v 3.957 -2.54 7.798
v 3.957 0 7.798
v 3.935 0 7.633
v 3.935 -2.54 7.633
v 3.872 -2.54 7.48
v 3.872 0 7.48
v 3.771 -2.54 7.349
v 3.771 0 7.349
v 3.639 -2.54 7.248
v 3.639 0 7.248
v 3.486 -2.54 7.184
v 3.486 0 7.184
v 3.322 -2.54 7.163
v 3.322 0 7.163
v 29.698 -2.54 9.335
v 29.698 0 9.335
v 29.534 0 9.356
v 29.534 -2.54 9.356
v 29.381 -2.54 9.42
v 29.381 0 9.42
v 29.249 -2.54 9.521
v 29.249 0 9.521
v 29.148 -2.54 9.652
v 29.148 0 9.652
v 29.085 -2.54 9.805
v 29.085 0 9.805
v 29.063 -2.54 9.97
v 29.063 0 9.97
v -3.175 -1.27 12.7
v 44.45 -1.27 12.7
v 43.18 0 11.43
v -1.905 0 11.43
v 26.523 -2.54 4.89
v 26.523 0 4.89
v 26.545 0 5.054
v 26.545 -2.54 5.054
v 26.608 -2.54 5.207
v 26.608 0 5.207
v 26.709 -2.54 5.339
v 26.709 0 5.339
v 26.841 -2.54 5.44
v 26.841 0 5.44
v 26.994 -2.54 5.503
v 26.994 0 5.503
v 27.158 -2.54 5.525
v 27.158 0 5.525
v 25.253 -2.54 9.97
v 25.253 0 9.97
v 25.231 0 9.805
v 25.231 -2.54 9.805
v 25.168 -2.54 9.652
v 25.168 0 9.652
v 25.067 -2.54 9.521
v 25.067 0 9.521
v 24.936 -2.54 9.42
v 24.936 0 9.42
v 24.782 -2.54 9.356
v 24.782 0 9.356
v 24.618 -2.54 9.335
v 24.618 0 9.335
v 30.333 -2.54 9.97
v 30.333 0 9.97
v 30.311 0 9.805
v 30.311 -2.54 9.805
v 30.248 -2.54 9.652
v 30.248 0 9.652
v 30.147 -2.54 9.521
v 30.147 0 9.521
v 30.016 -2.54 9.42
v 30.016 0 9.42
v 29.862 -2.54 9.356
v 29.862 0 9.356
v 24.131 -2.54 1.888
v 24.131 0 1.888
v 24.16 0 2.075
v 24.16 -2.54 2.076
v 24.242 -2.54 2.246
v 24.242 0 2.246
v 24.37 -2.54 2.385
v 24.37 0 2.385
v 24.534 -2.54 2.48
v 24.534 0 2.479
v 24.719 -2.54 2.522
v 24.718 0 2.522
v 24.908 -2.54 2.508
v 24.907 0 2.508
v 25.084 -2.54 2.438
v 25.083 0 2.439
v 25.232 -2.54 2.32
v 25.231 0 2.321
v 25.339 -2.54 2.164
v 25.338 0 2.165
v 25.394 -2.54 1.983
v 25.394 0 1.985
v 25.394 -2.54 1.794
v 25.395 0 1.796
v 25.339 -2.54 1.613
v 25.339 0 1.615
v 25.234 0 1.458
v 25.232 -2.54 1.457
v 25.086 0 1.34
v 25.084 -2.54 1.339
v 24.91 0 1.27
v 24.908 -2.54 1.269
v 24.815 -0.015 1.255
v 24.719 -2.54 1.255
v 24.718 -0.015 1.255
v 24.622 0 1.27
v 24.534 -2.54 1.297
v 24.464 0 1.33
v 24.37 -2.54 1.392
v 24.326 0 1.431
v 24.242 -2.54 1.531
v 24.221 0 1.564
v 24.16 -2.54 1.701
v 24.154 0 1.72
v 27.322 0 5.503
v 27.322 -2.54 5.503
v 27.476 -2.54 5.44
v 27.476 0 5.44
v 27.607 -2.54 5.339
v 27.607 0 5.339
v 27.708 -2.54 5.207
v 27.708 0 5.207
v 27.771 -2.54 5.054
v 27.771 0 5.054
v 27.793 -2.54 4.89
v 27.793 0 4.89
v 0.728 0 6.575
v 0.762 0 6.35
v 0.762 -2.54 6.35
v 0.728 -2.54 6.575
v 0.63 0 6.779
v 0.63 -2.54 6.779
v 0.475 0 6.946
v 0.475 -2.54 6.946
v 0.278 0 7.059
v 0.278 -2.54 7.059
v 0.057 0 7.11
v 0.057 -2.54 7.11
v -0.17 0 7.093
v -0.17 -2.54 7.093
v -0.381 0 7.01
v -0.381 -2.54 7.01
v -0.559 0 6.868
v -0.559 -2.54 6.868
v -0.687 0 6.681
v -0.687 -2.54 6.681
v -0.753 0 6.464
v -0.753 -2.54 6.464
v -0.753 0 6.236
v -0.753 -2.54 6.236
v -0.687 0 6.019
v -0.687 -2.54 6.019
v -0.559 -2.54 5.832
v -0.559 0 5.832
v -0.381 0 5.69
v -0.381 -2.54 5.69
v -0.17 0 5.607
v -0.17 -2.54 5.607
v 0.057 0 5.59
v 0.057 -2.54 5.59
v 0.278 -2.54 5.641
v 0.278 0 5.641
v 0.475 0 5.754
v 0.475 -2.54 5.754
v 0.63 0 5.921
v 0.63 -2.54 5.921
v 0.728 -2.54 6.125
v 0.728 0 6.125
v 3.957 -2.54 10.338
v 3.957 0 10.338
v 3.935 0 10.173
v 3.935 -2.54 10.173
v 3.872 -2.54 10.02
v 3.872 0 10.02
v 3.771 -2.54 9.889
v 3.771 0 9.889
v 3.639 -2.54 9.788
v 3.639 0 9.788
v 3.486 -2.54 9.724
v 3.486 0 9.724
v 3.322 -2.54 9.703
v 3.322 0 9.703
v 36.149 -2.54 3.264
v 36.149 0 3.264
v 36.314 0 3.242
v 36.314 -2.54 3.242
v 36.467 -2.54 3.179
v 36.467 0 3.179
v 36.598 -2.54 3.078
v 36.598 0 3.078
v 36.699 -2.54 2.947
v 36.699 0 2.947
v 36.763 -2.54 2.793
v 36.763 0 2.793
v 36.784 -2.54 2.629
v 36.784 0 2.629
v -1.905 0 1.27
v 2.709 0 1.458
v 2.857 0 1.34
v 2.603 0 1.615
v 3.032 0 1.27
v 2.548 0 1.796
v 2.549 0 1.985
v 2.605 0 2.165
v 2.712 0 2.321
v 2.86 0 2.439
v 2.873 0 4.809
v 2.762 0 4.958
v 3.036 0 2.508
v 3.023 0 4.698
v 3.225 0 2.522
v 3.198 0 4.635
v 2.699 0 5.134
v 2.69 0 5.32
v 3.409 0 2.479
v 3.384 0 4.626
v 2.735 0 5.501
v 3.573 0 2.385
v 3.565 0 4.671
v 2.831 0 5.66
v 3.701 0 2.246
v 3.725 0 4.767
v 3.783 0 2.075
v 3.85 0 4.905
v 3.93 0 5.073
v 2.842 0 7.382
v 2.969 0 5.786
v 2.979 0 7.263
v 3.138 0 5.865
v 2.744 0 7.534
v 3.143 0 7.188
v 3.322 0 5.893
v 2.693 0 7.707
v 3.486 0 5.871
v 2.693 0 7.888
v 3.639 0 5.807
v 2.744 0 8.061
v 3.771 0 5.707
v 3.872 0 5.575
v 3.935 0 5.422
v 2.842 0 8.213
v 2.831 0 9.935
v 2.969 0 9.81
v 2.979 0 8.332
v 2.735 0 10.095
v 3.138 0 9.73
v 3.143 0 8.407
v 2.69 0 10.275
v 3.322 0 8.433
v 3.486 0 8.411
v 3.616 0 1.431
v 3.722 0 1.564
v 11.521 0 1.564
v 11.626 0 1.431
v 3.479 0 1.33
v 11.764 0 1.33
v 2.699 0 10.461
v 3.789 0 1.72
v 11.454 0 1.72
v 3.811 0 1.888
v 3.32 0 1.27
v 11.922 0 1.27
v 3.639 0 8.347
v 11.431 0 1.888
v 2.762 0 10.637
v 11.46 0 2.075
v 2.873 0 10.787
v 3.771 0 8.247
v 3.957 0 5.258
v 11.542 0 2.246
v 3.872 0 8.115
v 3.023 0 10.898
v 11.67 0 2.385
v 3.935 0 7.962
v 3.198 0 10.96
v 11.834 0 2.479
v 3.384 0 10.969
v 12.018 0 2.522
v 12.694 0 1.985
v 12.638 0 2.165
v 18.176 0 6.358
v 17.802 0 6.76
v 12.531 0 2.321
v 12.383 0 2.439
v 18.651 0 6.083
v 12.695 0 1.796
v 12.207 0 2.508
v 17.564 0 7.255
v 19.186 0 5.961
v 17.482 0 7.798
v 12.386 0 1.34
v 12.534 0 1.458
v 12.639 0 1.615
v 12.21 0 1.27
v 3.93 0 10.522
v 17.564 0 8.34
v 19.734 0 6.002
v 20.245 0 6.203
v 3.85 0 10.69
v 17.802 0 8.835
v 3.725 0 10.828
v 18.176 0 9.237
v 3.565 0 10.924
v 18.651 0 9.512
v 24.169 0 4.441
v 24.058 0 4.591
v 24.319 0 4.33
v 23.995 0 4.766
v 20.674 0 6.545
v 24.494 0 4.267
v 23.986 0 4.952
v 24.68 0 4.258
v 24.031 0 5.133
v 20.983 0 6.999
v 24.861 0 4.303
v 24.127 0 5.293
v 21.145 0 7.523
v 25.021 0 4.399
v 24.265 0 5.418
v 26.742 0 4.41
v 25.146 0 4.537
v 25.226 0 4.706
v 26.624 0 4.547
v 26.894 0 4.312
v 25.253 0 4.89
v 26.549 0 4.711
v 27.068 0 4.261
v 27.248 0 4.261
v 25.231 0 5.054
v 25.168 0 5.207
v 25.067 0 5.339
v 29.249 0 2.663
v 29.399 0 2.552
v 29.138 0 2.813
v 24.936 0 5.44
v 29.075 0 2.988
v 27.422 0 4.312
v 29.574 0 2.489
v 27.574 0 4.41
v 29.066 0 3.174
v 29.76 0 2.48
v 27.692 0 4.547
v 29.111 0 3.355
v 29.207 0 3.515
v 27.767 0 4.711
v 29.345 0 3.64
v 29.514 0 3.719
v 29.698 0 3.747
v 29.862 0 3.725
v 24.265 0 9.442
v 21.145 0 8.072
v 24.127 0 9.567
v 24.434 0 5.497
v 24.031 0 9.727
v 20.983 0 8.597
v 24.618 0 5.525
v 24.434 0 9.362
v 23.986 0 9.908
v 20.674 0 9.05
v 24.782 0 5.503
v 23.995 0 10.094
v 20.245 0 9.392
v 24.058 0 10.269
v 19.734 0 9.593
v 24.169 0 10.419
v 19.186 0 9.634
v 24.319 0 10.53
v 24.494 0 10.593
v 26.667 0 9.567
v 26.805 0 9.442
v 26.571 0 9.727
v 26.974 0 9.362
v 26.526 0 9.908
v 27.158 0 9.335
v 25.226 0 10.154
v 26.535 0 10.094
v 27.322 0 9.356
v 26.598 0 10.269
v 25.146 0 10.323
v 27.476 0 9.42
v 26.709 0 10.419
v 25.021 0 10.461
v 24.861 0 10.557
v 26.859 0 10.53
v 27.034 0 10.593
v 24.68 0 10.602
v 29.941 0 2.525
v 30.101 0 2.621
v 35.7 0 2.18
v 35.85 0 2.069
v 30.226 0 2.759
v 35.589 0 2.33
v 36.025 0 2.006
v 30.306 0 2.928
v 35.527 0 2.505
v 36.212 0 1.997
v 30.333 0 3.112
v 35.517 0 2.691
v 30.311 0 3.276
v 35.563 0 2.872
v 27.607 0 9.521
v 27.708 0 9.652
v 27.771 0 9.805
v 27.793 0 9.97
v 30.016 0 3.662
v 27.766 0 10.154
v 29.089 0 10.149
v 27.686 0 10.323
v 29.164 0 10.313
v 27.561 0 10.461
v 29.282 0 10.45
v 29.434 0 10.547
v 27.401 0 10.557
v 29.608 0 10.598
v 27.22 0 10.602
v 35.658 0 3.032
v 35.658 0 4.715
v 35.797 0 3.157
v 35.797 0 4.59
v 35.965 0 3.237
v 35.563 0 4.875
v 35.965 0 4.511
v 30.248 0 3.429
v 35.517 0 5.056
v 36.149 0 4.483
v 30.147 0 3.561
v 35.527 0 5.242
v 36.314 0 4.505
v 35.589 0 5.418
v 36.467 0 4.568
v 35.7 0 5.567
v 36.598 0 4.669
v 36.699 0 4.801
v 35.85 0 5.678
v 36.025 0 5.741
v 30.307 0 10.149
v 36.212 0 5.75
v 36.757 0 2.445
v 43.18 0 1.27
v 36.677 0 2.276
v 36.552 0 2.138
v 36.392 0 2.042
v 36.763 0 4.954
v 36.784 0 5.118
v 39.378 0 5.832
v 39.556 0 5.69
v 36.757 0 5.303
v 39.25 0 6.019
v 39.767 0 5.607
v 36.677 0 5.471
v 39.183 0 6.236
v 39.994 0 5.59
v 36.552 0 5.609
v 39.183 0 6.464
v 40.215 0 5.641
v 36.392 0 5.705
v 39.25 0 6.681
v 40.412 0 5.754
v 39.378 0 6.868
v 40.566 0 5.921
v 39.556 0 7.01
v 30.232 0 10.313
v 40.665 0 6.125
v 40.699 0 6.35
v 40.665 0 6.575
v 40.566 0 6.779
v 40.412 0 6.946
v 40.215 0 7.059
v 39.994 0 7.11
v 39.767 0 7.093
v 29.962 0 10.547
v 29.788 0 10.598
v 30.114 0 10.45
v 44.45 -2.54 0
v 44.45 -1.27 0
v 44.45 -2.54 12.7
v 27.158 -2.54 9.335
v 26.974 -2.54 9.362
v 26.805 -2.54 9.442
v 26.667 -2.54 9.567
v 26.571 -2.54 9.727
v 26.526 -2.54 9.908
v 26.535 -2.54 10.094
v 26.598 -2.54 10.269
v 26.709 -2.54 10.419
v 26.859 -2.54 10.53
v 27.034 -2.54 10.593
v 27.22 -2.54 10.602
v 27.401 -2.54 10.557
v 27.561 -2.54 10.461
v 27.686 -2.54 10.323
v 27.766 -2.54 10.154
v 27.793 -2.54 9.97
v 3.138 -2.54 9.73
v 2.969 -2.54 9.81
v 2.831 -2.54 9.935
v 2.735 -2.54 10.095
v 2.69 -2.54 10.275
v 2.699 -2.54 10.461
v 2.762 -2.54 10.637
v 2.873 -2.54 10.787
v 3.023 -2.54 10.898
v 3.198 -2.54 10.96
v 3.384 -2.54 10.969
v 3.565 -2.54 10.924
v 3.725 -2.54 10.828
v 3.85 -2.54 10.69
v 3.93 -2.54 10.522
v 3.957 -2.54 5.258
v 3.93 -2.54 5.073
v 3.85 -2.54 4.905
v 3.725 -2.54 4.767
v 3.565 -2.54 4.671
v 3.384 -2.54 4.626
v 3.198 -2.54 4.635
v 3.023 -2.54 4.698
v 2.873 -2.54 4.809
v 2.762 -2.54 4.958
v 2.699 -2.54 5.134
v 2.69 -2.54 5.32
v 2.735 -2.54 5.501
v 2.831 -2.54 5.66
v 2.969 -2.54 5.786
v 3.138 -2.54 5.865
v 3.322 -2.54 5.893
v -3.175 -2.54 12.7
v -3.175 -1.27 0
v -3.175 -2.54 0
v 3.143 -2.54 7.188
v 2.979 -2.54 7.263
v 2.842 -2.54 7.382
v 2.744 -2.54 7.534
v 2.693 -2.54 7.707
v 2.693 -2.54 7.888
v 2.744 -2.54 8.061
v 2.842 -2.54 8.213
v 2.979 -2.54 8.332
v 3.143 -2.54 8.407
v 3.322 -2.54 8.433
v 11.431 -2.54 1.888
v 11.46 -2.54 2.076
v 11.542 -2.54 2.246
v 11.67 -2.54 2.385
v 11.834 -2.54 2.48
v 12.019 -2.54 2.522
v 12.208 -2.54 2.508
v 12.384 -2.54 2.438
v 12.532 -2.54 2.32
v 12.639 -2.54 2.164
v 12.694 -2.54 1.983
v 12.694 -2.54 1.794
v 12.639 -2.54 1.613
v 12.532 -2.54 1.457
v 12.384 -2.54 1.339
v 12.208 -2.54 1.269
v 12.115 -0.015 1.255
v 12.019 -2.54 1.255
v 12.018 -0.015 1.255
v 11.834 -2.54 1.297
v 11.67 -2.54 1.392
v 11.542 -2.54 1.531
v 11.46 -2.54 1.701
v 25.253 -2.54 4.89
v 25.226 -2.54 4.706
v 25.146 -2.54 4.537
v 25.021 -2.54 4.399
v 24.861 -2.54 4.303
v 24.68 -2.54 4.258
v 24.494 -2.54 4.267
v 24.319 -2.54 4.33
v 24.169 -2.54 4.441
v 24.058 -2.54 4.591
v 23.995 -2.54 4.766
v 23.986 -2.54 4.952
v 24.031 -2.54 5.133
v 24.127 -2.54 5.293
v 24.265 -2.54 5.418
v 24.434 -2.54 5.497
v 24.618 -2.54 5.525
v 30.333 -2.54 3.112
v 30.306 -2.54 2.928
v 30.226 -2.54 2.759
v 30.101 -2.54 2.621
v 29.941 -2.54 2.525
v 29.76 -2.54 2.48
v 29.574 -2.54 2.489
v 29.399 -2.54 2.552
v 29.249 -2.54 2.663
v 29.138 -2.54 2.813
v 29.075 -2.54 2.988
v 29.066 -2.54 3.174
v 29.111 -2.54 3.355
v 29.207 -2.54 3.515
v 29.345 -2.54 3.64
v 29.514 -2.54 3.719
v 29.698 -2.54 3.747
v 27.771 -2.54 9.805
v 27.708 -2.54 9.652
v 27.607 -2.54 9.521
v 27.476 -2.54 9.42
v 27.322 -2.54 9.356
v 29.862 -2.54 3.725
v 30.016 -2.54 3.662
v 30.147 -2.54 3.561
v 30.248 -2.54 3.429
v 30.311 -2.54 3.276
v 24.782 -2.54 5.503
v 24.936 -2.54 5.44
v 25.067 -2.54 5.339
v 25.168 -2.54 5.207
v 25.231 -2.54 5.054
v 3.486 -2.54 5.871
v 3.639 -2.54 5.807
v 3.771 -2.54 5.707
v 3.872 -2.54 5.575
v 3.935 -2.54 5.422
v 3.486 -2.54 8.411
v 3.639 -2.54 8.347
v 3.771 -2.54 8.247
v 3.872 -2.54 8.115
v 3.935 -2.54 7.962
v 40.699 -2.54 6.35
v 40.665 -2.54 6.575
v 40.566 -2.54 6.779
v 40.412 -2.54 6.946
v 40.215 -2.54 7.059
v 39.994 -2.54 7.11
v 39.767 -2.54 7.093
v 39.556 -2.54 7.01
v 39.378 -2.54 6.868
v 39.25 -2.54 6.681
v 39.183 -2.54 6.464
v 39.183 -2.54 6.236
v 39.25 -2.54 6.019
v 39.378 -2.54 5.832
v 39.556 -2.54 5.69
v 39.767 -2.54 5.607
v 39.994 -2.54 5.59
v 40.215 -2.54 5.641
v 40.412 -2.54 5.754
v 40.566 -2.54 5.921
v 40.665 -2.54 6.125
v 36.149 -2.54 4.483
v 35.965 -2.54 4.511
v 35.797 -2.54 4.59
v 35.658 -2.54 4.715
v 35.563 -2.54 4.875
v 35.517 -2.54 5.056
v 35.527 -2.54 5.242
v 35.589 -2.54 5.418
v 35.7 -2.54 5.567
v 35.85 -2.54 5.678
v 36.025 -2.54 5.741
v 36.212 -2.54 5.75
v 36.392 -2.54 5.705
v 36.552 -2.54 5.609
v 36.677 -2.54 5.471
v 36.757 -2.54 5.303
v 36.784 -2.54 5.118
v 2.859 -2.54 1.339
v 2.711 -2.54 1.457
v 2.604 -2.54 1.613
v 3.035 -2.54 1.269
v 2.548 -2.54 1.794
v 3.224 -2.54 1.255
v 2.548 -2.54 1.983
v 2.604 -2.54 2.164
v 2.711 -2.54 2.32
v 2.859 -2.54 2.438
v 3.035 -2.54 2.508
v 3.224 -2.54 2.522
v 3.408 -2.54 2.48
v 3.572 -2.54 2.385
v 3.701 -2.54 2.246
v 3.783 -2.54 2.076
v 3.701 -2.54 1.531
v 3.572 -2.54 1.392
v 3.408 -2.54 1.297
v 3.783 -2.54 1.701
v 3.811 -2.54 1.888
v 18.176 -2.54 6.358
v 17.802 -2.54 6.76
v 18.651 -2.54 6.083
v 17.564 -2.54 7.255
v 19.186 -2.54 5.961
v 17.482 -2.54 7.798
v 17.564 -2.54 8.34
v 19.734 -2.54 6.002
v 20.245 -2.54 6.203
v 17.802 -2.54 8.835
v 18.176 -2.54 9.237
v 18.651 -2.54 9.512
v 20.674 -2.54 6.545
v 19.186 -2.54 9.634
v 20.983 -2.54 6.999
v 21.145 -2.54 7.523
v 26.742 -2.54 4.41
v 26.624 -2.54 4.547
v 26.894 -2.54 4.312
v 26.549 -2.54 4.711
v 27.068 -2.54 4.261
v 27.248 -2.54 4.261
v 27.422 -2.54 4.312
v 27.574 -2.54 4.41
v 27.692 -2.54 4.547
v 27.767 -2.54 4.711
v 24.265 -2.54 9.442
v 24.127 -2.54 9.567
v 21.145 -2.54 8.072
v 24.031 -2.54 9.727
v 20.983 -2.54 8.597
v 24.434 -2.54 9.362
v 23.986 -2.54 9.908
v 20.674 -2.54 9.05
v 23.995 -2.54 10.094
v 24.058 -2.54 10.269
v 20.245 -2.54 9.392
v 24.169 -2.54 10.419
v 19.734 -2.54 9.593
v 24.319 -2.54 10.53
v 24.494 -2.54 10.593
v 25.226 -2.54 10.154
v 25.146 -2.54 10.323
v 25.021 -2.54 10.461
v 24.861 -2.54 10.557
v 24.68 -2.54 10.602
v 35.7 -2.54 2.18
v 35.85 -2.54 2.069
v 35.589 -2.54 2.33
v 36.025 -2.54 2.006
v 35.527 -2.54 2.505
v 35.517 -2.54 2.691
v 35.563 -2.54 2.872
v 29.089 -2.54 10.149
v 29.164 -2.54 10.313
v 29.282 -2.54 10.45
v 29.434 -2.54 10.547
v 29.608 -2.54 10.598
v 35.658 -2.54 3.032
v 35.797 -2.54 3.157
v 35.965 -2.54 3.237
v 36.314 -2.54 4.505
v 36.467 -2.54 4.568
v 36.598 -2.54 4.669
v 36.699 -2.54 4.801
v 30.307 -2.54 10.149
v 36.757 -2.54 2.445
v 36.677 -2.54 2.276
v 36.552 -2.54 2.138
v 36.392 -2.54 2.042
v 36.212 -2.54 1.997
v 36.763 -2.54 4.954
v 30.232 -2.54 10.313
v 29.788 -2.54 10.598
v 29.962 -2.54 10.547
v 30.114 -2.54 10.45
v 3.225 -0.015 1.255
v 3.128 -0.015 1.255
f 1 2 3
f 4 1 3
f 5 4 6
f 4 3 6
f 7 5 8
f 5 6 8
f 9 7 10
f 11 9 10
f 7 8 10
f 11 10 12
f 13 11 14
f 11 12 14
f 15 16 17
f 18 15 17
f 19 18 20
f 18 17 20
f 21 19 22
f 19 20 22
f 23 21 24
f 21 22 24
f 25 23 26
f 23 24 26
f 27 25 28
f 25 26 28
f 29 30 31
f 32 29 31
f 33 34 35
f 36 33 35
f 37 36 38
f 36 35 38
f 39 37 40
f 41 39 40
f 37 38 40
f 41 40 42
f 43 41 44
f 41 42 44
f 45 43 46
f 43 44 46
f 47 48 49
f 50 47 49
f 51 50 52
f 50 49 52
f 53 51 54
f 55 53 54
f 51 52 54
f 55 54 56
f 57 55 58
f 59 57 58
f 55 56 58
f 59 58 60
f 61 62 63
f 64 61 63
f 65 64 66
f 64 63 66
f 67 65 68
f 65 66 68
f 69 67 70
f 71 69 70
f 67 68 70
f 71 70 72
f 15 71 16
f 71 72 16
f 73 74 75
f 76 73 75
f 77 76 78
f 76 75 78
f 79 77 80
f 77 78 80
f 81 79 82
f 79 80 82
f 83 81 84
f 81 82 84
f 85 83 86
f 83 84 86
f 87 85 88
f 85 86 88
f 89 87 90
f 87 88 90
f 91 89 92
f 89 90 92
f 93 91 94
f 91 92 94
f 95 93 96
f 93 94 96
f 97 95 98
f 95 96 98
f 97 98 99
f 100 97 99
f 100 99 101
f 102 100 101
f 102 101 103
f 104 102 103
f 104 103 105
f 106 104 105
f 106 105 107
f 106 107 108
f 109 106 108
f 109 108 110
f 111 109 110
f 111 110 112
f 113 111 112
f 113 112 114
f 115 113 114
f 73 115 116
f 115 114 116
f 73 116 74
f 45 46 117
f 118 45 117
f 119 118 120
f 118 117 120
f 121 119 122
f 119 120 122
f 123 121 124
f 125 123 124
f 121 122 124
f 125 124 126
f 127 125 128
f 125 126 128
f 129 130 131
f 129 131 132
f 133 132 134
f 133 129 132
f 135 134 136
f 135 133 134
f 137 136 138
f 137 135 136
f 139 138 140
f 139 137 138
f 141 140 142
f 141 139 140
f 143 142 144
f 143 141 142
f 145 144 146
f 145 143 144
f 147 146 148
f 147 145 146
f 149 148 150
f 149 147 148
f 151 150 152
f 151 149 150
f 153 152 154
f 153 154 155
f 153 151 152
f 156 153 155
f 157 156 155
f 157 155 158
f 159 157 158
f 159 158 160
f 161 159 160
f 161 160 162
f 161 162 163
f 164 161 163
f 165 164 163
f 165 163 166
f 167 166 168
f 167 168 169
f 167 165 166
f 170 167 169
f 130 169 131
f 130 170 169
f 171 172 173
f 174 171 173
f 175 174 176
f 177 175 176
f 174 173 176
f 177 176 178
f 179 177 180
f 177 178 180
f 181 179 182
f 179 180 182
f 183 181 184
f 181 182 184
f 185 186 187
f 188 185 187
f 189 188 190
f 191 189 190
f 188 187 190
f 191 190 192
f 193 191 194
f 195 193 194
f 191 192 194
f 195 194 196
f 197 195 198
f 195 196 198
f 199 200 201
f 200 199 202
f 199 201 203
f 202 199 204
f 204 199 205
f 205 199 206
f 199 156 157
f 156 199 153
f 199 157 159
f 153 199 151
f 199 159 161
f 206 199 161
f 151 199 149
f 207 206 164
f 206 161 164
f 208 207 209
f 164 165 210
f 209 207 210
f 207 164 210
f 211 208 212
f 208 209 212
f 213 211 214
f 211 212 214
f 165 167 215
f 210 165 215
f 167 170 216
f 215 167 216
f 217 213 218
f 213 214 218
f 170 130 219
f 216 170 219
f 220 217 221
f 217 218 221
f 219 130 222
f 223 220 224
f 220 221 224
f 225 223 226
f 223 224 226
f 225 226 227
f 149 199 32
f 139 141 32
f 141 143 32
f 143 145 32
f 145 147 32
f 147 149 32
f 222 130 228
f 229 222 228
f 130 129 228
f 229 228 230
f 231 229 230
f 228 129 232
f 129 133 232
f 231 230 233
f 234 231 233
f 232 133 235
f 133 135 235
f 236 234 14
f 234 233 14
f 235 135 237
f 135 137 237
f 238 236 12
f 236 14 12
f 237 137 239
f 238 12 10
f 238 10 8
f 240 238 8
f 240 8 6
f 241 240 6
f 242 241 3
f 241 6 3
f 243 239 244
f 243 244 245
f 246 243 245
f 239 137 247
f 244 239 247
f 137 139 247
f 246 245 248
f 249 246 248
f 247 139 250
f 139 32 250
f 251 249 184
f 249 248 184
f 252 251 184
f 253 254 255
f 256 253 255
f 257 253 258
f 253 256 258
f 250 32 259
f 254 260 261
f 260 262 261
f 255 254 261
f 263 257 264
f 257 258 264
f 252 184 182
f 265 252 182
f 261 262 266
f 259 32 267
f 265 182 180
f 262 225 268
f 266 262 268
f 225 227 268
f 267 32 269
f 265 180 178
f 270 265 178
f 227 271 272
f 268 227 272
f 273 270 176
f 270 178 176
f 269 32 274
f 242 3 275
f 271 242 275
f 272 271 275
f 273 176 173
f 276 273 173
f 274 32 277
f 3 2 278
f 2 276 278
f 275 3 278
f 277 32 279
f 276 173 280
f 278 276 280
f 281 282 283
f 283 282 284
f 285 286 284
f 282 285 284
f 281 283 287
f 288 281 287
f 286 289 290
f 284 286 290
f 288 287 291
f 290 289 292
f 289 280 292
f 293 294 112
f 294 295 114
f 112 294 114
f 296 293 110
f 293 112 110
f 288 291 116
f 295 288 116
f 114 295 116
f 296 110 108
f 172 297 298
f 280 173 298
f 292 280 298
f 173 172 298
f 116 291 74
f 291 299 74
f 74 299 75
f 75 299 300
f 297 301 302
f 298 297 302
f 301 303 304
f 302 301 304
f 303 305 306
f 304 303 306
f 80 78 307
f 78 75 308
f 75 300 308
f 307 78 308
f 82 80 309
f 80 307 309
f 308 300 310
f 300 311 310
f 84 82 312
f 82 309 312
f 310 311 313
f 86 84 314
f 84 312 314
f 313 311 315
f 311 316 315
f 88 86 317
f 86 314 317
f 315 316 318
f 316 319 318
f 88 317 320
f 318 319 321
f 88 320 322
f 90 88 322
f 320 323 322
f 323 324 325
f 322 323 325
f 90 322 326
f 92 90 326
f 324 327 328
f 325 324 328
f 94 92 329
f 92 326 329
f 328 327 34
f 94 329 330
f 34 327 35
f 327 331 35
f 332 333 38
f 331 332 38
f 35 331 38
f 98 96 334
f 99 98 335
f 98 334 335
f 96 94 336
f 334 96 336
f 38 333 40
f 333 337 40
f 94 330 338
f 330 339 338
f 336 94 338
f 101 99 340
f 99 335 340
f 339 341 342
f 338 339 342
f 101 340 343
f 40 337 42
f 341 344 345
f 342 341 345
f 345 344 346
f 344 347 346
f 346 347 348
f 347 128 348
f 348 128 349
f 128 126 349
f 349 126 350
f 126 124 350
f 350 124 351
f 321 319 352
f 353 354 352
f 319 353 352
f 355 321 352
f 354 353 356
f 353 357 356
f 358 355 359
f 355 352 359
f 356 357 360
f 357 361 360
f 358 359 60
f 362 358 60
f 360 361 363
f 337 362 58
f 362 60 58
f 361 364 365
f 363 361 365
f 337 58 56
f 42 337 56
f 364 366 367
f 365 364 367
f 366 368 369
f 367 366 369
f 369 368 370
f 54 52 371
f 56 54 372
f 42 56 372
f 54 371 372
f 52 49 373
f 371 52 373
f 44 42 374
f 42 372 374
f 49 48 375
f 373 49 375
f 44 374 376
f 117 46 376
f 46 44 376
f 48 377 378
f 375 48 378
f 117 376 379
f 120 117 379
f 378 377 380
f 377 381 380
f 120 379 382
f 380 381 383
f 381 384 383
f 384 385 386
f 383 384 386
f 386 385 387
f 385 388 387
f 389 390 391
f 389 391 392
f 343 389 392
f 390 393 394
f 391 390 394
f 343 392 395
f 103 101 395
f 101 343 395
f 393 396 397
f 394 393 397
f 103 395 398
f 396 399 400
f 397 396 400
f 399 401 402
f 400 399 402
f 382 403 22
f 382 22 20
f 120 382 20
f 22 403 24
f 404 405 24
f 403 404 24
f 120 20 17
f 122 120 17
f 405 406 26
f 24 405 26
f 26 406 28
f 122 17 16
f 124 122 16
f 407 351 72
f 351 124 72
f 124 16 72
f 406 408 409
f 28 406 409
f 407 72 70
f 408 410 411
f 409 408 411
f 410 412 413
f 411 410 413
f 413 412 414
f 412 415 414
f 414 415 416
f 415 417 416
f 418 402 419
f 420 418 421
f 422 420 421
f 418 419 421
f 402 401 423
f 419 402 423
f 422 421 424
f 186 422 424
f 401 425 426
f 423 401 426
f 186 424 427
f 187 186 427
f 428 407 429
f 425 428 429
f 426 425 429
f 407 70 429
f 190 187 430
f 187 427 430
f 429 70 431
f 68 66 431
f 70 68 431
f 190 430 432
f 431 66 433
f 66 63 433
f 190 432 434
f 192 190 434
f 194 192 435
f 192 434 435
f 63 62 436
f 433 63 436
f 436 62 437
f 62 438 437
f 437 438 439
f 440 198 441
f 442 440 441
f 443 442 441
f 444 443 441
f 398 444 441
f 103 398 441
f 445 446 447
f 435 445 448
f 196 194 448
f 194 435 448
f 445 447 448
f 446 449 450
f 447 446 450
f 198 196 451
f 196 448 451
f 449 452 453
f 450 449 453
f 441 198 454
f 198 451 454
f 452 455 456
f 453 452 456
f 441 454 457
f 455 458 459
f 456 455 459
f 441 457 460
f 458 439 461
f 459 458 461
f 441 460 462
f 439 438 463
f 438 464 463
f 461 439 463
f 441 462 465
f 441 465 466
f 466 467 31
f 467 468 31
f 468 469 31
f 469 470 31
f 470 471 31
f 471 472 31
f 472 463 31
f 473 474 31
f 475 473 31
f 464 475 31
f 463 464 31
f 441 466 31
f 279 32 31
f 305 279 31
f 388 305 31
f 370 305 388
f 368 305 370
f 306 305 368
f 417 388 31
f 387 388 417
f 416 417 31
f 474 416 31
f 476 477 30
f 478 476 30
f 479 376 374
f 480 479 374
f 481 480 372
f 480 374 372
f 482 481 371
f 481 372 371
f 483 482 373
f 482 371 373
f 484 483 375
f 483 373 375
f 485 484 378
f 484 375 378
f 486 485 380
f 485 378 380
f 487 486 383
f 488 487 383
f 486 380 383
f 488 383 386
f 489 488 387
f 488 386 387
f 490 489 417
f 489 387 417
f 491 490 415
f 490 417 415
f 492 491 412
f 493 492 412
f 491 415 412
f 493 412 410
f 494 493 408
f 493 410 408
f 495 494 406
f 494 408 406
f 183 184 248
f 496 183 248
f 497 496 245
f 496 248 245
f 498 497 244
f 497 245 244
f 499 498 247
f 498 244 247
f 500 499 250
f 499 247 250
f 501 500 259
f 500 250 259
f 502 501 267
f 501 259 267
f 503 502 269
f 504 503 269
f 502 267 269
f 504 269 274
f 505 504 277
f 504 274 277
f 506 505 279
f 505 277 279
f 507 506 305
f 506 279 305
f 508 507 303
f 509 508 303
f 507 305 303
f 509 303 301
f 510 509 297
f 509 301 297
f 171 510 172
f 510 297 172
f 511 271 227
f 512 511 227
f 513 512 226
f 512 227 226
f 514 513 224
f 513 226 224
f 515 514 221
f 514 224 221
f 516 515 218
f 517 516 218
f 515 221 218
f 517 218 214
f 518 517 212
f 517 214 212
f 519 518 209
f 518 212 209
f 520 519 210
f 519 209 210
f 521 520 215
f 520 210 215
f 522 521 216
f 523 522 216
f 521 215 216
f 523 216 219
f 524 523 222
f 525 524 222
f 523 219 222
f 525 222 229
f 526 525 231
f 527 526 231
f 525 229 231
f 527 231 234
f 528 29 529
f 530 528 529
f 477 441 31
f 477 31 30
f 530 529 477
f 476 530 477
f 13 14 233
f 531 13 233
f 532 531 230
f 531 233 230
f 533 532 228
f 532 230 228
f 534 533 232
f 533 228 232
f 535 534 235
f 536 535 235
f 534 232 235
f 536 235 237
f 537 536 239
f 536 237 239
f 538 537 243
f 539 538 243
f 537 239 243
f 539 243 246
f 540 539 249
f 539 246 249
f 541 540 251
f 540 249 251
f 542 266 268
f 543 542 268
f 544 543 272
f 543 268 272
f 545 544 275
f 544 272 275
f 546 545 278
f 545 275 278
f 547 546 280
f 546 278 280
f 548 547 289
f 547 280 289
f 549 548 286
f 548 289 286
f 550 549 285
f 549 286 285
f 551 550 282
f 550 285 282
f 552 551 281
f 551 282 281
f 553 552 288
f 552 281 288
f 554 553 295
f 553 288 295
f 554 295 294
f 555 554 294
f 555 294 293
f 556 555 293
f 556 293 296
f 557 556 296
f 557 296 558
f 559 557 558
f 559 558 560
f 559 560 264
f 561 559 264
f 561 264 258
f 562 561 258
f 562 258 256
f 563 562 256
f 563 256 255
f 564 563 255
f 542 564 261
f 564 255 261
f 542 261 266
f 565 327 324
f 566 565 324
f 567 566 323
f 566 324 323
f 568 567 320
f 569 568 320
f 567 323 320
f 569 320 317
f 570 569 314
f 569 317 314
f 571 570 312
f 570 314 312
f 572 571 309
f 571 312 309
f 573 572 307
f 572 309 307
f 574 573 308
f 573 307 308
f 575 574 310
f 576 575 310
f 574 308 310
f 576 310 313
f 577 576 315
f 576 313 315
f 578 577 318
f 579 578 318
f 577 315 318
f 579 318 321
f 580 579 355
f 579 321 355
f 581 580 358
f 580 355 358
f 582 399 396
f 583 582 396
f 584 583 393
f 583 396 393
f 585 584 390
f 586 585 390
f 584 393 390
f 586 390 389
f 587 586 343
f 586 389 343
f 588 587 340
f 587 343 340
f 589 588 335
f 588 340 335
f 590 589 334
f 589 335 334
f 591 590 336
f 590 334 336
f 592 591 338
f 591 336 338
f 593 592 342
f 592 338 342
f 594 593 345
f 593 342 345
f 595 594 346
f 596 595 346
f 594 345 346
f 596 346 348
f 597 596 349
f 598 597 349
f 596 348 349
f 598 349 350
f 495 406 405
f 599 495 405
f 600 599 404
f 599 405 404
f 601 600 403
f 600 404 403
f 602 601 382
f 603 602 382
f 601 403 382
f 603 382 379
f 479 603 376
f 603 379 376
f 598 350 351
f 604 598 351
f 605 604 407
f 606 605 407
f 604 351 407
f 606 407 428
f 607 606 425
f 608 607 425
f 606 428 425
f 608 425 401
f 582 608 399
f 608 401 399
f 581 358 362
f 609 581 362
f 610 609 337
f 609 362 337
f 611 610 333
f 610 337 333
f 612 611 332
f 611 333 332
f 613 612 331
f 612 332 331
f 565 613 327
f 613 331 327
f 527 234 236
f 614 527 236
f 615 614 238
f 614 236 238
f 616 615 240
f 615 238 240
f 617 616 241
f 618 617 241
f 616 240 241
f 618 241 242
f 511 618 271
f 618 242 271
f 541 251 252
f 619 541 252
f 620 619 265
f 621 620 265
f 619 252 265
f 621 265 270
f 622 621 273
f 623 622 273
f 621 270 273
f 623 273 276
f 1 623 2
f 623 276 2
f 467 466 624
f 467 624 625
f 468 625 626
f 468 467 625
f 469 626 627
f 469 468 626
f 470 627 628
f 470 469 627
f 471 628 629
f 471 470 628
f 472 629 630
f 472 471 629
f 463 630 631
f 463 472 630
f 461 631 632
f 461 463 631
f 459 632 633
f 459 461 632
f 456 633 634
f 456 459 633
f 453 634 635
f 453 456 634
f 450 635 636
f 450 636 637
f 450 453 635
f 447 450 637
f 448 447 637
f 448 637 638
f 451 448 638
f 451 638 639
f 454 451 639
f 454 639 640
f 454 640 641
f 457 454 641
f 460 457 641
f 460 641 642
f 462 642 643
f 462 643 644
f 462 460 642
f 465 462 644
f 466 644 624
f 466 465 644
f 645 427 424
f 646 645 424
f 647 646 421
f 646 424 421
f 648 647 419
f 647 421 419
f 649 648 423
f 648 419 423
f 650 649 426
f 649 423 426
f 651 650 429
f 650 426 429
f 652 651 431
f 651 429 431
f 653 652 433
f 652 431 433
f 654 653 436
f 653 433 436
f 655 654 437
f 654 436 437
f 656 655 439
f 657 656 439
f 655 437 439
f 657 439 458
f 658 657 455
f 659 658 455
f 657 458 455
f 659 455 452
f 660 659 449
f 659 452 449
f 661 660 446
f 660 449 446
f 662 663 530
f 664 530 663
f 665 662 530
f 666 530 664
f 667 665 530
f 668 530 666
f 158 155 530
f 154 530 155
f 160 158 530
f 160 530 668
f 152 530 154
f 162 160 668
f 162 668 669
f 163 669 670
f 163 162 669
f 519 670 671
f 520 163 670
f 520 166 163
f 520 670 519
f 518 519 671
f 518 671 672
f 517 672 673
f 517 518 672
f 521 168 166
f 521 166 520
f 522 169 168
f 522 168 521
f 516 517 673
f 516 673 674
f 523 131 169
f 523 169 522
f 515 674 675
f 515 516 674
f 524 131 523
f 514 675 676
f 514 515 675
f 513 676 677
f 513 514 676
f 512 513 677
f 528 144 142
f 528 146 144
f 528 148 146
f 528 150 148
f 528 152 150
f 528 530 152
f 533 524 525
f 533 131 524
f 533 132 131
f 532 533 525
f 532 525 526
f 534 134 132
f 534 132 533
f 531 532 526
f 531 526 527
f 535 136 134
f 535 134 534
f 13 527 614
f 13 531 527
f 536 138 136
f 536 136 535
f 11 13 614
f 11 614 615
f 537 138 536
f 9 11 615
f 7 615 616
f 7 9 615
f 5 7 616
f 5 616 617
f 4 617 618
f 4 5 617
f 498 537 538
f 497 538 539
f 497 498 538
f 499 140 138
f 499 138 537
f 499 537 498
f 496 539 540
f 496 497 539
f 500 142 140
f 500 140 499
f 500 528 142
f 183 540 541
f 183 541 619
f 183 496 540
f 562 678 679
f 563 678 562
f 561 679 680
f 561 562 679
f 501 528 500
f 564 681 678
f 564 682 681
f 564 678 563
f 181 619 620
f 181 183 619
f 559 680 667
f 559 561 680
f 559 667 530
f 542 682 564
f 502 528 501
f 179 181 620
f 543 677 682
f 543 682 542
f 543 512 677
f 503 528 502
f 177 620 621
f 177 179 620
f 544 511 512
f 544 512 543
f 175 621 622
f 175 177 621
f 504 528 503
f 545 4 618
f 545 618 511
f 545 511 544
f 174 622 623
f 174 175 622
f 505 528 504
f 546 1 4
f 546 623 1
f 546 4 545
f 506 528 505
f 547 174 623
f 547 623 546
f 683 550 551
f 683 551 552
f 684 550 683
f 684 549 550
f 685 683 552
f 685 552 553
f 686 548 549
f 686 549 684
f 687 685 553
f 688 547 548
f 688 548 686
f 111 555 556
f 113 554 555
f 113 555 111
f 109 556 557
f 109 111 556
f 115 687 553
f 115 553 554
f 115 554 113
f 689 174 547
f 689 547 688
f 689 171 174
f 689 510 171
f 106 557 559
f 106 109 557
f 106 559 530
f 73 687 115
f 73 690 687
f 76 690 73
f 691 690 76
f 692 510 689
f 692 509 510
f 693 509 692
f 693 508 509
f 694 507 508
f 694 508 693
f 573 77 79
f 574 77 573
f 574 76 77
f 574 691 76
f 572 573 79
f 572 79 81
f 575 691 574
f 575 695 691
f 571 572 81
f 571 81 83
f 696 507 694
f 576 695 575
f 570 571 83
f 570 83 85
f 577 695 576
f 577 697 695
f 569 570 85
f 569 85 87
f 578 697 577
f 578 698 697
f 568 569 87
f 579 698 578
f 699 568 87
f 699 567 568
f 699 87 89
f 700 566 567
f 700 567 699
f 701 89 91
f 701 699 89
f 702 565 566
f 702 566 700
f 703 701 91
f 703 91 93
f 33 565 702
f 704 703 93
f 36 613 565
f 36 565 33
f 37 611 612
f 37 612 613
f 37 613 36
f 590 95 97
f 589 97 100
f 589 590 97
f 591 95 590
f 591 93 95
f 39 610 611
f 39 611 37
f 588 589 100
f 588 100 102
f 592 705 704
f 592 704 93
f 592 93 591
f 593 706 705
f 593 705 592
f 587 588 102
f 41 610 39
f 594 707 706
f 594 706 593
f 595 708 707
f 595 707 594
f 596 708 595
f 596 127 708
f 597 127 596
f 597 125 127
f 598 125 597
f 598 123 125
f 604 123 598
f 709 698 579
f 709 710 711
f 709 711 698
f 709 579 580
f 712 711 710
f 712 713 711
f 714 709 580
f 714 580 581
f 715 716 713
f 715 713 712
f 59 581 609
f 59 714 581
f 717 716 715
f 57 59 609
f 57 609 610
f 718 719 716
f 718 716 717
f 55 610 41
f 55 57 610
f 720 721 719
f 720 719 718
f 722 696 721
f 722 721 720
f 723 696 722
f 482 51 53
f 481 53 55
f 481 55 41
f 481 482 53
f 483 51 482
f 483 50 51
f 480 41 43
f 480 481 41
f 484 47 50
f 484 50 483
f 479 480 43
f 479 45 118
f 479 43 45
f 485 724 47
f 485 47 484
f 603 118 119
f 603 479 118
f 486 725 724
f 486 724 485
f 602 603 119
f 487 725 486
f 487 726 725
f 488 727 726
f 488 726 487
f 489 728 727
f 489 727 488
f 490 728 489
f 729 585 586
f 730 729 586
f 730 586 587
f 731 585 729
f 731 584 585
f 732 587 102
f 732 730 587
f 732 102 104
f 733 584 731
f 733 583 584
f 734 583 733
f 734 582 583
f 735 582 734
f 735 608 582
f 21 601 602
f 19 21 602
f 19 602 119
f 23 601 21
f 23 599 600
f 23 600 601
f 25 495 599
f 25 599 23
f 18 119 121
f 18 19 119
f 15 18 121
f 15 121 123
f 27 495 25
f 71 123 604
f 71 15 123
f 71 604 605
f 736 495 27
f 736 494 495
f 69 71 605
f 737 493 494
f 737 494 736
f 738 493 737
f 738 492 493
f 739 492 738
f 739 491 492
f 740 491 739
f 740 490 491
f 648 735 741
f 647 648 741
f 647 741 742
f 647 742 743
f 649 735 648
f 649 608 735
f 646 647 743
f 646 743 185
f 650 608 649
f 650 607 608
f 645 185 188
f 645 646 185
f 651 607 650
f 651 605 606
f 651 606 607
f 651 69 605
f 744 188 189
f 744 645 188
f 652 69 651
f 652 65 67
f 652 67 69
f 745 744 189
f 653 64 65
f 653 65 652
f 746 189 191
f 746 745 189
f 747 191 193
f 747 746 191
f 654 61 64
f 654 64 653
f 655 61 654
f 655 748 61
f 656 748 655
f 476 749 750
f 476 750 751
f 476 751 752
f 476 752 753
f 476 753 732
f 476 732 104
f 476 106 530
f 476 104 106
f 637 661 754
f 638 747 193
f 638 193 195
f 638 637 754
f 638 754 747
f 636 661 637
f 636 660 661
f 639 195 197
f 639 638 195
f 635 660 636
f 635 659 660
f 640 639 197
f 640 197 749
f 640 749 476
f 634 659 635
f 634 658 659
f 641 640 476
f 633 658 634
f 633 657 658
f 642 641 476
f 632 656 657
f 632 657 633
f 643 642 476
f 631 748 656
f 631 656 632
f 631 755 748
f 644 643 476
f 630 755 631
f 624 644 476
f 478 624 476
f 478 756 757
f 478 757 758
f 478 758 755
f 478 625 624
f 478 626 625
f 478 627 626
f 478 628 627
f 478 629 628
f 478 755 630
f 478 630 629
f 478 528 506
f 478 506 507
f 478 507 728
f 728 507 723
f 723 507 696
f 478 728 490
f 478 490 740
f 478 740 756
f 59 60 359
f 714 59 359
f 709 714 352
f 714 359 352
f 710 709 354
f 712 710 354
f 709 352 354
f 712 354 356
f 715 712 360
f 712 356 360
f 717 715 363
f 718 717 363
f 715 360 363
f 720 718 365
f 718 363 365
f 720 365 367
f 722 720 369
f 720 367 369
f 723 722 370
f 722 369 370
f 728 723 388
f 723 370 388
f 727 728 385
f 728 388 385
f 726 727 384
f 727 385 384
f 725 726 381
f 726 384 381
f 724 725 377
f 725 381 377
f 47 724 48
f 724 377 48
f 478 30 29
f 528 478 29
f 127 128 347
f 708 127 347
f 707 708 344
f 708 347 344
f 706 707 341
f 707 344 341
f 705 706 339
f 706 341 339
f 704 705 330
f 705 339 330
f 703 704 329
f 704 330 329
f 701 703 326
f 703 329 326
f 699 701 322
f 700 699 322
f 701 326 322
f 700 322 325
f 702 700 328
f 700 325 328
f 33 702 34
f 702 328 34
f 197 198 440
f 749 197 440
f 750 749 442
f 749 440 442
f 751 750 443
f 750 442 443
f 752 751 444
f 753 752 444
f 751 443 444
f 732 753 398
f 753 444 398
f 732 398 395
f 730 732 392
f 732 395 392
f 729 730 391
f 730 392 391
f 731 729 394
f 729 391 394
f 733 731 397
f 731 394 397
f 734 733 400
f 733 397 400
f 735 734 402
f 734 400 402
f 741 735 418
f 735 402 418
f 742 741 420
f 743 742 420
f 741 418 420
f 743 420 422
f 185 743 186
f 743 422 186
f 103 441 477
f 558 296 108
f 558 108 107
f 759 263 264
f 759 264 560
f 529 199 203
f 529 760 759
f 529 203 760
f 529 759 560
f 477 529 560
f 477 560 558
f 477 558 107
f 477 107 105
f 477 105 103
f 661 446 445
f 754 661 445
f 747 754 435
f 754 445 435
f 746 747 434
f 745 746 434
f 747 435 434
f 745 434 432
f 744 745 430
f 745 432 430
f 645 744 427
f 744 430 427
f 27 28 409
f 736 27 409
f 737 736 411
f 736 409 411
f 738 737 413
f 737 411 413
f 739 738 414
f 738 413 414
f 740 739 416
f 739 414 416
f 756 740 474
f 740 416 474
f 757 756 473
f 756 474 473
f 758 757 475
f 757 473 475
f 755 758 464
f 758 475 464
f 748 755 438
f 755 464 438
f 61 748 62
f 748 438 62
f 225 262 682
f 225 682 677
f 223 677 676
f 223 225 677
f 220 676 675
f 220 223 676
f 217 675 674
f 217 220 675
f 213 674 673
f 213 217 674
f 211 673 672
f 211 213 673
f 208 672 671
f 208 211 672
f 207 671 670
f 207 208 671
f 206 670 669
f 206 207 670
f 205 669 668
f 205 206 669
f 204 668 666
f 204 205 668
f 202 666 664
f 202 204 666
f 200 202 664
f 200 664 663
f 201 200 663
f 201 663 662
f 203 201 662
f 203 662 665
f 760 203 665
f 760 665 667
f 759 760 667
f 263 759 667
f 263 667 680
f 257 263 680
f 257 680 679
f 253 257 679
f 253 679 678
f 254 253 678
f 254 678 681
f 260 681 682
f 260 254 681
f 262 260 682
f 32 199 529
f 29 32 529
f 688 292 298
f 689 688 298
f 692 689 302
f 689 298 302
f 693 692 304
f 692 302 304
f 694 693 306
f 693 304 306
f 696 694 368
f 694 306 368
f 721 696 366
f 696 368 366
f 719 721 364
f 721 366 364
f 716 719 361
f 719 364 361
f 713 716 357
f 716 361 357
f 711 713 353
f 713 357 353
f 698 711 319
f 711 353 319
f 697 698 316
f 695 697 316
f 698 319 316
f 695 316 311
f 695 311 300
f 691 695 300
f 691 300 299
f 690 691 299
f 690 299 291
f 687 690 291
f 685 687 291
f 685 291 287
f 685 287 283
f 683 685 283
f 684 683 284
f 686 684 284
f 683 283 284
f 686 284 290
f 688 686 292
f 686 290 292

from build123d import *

# Parameters (mm, degrees)
F0_R        = 0.635
F0_R_2      = 0.762
F1_DEPTH    = 2.54
F2_T1_DEPTH = 19.2320747894
F2_T3_DEPTH = 54.1570747894


# Not quite as in the source:
# - a fillet or chamfer that OpenCascade refuses, or shapes differently, is made with other operations: its cross-section is extruded or revolved along the edge and cut away or added


with BuildPart() as f1:
    # F0 (on Front) → F1 (new body)
    with BuildSketch(Plane.XZ):
        Polygon((44.45, 12.7), (0, 12.7), (-3.175, 12.7), (-3.175, 0), (0, 0), (44.45, 0), align=None)
        with Locations((3.1763850711, 1.8884516321)):
            Circle(F0_R, mode=Mode.SUBTRACT)
        with BuildLine():
            ThreePointArc((12.7013850711, 1.8884516321), (12.0663850711, 1.2534516321), (11.4313850711, 1.8884516321))
            ThreePointArc((11.4313850711, 1.8884516321), (12.0663850711, 2.5234516321), (12.7013850711, 1.8884516321))
        make_face(mode=Mode.SUBTRACT)
        with Locations((0, 6.35)):
            Circle(F0_R_2, mode=Mode.SUBTRACT)
        with BuildLine():
            ThreePointArc((3.9569724428, 5.2575343288), (2.8729596367, 4.8085215228), (3.3219724428, 5.8925343288))
            ThreePointArc((3.3219724428, 5.8925343288), (3.7709852488, 5.7065471349), (3.9569724428, 5.2575343288))
        make_face(mode=Mode.SUBTRACT)
        with BuildLine():
            ThreePointArc((25.4013850711, 1.8884516321), (24.7663850711, 1.2534516321), (24.1313850711, 1.8884516321))
            ThreePointArc((24.1313850711, 1.8884516321), (24.7663850711, 2.5234516321), (25.4013850711, 1.8884516321))
        make_face(mode=Mode.SUBTRACT)
        with BuildLine():
            ThreePointArc((30.3330272979, 3.1118398262), (29.2490144918, 2.6628270202), (29.6980272979, 3.7468398262))
            ThreePointArc((29.6980272979, 3.7468398262), (30.1470401039, 3.5608526323), (30.3330272979, 3.1118398262))
        make_face(mode=Mode.SUBTRACT)
        with BuildLine():
            ThreePointArc((36.7843080854, 2.629004186), (35.7002952794, 2.17999138), (36.1493080854, 3.264004186))
            ThreePointArc((36.1493080854, 3.264004186), (36.5983208915, 3.0780169921), (36.7843080854, 2.629004186))
        make_face(mode=Mode.SUBTRACT)
        with BuildLine():
            ThreePointArc((25.2530272979, 4.8898398262), (24.1690144918, 4.4408270202), (24.6180272979, 5.5248398262))
            ThreePointArc((24.6180272979, 5.5248398262), (25.0670401039, 5.3388526323), (25.2530272979, 4.8898398262))
        make_face(mode=Mode.SUBTRACT)
        with BuildLine():
            ThreePointArc((27.7930272979, 4.8898398262), (27.1580272979, 4.2548398262), (26.5230272979, 4.8898398262))
            ThreePointArc((26.5230272979, 4.8898398262), (26.7090144918, 5.3388526323), (27.1580272979, 5.5248398262))
            ThreePointArc((27.1580272979, 5.5248398262), (27.6070401039, 5.3388526323), (27.7930272979, 4.8898398262))
        make_face(mode=Mode.SUBTRACT)
        with BuildLine():
            ThreePointArc((36.7843080854, 5.118204186), (36.5983208915, 4.66919138), (36.1493080854, 4.483204186))
            ThreePointArc((36.1493080854, 4.483204186), (35.7002952794, 5.5672169921), (36.7843080854, 5.118204186))
        make_face(mode=Mode.SUBTRACT)
        with Locations((39.9367623031, 6.35)):
            Circle(F0_R_2, mode=Mode.SUBTRACT)
        with BuildLine():
            ThreePointArc((3.3219724428, 7.1625343288), (2.6869724428, 7.7975343288), (3.3219724428, 8.4325343288))
            ThreePointArc((3.3219724428, 8.4325343288), (3.7709852488, 8.2465471349), (3.9569724428, 7.7975343288))
            ThreePointArc((3.9569724428, 7.7975343288), (3.7709852488, 7.3485215228), (3.3219724428, 7.1625343288))
        make_face(mode=Mode.SUBTRACT)
        with BuildLine():
            ThreePointArc((21.1654724428, 7.7975343288), (19.3239724428, 5.9560343288), (17.4824724428, 7.7975343288))
            ThreePointArc((17.4824724428, 7.7975343288), (19.3239724428, 9.6390343288), (21.1654724428, 7.7975343288))
        make_face(mode=Mode.SUBTRACT)
        with BuildLine():
            ThreePointArc((3.3219724428, 9.7025343288), (2.8729596367, 10.7865471349), (3.9569724428, 10.3375343288))
            ThreePointArc((3.9569724428, 10.3375343288), (3.7709852488, 9.8885215228), (3.3219724428, 9.7025343288))
        make_face(mode=Mode.SUBTRACT)
        with BuildLine():
            ThreePointArc((25.2530272979, 9.9698398262), (25.0670401039, 9.5208270202), (24.6180272979, 9.3348398262))
            ThreePointArc((24.6180272979, 9.3348398262), (24.1690144918, 10.4188526323), (25.2530272979, 9.9698398262))
        make_face(mode=Mode.SUBTRACT)
        with BuildLine():
            ThreePointArc((27.7930272979, 9.9698398262), (27.6070401039, 9.5208270202), (27.1580272979, 9.3348398262))
            ThreePointArc((27.1580272979, 9.3348398262), (26.7090144918, 10.4188526323), (27.7930272979, 9.9698398262))
        make_face(mode=Mode.SUBTRACT)
        with BuildLine():
            ThreePointArc((29.6980272979, 9.3348398262), (29.2490144918, 9.5208270202), (29.0630272979, 9.9698398262))
            ThreePointArc((29.0630272979, 9.9698398262), (29.6980272979, 10.6048398262), (30.3330272979, 9.9698398262))
            ThreePointArc((30.3330272979, 9.9698398262), (30.1470401039, 9.5208270202), (29.6980272979, 9.3348398262))
        make_face(mode=Mode.SUBTRACT)
    extrude(amount=F1_DEPTH)

    # F2: chamfer of 1.27 on 4 edges, made by hand

    # F2_s2 → F2_t1 (cut)
    with BuildSketch(Plane.XY.offset(-3.2660373947)):
        Polygon((43.18, 0), (44.45, -1.27), (44.45, 0), align=None)
        Polygon((-1.905, 0), (-3.175, -1.27), (-3.175, 0), align=None)
    extrude(amount=F2_T1_DEPTH, mode=Mode.SUBTRACT)

    # F2_s4 → F2_t3 (cut)
    with BuildSketch(Plane.YZ.offset(-6.4410373947)):
        Polygon((-1.27, 12.7), (0, 11.43), (0, 12.7), align=None)
        Polygon((0, 1.27), (-1.27, 0), (0, 0), align=None)
    extrude(amount=F2_T3_DEPTH, mode=Mode.SUBTRACT)


solid = f1.part
